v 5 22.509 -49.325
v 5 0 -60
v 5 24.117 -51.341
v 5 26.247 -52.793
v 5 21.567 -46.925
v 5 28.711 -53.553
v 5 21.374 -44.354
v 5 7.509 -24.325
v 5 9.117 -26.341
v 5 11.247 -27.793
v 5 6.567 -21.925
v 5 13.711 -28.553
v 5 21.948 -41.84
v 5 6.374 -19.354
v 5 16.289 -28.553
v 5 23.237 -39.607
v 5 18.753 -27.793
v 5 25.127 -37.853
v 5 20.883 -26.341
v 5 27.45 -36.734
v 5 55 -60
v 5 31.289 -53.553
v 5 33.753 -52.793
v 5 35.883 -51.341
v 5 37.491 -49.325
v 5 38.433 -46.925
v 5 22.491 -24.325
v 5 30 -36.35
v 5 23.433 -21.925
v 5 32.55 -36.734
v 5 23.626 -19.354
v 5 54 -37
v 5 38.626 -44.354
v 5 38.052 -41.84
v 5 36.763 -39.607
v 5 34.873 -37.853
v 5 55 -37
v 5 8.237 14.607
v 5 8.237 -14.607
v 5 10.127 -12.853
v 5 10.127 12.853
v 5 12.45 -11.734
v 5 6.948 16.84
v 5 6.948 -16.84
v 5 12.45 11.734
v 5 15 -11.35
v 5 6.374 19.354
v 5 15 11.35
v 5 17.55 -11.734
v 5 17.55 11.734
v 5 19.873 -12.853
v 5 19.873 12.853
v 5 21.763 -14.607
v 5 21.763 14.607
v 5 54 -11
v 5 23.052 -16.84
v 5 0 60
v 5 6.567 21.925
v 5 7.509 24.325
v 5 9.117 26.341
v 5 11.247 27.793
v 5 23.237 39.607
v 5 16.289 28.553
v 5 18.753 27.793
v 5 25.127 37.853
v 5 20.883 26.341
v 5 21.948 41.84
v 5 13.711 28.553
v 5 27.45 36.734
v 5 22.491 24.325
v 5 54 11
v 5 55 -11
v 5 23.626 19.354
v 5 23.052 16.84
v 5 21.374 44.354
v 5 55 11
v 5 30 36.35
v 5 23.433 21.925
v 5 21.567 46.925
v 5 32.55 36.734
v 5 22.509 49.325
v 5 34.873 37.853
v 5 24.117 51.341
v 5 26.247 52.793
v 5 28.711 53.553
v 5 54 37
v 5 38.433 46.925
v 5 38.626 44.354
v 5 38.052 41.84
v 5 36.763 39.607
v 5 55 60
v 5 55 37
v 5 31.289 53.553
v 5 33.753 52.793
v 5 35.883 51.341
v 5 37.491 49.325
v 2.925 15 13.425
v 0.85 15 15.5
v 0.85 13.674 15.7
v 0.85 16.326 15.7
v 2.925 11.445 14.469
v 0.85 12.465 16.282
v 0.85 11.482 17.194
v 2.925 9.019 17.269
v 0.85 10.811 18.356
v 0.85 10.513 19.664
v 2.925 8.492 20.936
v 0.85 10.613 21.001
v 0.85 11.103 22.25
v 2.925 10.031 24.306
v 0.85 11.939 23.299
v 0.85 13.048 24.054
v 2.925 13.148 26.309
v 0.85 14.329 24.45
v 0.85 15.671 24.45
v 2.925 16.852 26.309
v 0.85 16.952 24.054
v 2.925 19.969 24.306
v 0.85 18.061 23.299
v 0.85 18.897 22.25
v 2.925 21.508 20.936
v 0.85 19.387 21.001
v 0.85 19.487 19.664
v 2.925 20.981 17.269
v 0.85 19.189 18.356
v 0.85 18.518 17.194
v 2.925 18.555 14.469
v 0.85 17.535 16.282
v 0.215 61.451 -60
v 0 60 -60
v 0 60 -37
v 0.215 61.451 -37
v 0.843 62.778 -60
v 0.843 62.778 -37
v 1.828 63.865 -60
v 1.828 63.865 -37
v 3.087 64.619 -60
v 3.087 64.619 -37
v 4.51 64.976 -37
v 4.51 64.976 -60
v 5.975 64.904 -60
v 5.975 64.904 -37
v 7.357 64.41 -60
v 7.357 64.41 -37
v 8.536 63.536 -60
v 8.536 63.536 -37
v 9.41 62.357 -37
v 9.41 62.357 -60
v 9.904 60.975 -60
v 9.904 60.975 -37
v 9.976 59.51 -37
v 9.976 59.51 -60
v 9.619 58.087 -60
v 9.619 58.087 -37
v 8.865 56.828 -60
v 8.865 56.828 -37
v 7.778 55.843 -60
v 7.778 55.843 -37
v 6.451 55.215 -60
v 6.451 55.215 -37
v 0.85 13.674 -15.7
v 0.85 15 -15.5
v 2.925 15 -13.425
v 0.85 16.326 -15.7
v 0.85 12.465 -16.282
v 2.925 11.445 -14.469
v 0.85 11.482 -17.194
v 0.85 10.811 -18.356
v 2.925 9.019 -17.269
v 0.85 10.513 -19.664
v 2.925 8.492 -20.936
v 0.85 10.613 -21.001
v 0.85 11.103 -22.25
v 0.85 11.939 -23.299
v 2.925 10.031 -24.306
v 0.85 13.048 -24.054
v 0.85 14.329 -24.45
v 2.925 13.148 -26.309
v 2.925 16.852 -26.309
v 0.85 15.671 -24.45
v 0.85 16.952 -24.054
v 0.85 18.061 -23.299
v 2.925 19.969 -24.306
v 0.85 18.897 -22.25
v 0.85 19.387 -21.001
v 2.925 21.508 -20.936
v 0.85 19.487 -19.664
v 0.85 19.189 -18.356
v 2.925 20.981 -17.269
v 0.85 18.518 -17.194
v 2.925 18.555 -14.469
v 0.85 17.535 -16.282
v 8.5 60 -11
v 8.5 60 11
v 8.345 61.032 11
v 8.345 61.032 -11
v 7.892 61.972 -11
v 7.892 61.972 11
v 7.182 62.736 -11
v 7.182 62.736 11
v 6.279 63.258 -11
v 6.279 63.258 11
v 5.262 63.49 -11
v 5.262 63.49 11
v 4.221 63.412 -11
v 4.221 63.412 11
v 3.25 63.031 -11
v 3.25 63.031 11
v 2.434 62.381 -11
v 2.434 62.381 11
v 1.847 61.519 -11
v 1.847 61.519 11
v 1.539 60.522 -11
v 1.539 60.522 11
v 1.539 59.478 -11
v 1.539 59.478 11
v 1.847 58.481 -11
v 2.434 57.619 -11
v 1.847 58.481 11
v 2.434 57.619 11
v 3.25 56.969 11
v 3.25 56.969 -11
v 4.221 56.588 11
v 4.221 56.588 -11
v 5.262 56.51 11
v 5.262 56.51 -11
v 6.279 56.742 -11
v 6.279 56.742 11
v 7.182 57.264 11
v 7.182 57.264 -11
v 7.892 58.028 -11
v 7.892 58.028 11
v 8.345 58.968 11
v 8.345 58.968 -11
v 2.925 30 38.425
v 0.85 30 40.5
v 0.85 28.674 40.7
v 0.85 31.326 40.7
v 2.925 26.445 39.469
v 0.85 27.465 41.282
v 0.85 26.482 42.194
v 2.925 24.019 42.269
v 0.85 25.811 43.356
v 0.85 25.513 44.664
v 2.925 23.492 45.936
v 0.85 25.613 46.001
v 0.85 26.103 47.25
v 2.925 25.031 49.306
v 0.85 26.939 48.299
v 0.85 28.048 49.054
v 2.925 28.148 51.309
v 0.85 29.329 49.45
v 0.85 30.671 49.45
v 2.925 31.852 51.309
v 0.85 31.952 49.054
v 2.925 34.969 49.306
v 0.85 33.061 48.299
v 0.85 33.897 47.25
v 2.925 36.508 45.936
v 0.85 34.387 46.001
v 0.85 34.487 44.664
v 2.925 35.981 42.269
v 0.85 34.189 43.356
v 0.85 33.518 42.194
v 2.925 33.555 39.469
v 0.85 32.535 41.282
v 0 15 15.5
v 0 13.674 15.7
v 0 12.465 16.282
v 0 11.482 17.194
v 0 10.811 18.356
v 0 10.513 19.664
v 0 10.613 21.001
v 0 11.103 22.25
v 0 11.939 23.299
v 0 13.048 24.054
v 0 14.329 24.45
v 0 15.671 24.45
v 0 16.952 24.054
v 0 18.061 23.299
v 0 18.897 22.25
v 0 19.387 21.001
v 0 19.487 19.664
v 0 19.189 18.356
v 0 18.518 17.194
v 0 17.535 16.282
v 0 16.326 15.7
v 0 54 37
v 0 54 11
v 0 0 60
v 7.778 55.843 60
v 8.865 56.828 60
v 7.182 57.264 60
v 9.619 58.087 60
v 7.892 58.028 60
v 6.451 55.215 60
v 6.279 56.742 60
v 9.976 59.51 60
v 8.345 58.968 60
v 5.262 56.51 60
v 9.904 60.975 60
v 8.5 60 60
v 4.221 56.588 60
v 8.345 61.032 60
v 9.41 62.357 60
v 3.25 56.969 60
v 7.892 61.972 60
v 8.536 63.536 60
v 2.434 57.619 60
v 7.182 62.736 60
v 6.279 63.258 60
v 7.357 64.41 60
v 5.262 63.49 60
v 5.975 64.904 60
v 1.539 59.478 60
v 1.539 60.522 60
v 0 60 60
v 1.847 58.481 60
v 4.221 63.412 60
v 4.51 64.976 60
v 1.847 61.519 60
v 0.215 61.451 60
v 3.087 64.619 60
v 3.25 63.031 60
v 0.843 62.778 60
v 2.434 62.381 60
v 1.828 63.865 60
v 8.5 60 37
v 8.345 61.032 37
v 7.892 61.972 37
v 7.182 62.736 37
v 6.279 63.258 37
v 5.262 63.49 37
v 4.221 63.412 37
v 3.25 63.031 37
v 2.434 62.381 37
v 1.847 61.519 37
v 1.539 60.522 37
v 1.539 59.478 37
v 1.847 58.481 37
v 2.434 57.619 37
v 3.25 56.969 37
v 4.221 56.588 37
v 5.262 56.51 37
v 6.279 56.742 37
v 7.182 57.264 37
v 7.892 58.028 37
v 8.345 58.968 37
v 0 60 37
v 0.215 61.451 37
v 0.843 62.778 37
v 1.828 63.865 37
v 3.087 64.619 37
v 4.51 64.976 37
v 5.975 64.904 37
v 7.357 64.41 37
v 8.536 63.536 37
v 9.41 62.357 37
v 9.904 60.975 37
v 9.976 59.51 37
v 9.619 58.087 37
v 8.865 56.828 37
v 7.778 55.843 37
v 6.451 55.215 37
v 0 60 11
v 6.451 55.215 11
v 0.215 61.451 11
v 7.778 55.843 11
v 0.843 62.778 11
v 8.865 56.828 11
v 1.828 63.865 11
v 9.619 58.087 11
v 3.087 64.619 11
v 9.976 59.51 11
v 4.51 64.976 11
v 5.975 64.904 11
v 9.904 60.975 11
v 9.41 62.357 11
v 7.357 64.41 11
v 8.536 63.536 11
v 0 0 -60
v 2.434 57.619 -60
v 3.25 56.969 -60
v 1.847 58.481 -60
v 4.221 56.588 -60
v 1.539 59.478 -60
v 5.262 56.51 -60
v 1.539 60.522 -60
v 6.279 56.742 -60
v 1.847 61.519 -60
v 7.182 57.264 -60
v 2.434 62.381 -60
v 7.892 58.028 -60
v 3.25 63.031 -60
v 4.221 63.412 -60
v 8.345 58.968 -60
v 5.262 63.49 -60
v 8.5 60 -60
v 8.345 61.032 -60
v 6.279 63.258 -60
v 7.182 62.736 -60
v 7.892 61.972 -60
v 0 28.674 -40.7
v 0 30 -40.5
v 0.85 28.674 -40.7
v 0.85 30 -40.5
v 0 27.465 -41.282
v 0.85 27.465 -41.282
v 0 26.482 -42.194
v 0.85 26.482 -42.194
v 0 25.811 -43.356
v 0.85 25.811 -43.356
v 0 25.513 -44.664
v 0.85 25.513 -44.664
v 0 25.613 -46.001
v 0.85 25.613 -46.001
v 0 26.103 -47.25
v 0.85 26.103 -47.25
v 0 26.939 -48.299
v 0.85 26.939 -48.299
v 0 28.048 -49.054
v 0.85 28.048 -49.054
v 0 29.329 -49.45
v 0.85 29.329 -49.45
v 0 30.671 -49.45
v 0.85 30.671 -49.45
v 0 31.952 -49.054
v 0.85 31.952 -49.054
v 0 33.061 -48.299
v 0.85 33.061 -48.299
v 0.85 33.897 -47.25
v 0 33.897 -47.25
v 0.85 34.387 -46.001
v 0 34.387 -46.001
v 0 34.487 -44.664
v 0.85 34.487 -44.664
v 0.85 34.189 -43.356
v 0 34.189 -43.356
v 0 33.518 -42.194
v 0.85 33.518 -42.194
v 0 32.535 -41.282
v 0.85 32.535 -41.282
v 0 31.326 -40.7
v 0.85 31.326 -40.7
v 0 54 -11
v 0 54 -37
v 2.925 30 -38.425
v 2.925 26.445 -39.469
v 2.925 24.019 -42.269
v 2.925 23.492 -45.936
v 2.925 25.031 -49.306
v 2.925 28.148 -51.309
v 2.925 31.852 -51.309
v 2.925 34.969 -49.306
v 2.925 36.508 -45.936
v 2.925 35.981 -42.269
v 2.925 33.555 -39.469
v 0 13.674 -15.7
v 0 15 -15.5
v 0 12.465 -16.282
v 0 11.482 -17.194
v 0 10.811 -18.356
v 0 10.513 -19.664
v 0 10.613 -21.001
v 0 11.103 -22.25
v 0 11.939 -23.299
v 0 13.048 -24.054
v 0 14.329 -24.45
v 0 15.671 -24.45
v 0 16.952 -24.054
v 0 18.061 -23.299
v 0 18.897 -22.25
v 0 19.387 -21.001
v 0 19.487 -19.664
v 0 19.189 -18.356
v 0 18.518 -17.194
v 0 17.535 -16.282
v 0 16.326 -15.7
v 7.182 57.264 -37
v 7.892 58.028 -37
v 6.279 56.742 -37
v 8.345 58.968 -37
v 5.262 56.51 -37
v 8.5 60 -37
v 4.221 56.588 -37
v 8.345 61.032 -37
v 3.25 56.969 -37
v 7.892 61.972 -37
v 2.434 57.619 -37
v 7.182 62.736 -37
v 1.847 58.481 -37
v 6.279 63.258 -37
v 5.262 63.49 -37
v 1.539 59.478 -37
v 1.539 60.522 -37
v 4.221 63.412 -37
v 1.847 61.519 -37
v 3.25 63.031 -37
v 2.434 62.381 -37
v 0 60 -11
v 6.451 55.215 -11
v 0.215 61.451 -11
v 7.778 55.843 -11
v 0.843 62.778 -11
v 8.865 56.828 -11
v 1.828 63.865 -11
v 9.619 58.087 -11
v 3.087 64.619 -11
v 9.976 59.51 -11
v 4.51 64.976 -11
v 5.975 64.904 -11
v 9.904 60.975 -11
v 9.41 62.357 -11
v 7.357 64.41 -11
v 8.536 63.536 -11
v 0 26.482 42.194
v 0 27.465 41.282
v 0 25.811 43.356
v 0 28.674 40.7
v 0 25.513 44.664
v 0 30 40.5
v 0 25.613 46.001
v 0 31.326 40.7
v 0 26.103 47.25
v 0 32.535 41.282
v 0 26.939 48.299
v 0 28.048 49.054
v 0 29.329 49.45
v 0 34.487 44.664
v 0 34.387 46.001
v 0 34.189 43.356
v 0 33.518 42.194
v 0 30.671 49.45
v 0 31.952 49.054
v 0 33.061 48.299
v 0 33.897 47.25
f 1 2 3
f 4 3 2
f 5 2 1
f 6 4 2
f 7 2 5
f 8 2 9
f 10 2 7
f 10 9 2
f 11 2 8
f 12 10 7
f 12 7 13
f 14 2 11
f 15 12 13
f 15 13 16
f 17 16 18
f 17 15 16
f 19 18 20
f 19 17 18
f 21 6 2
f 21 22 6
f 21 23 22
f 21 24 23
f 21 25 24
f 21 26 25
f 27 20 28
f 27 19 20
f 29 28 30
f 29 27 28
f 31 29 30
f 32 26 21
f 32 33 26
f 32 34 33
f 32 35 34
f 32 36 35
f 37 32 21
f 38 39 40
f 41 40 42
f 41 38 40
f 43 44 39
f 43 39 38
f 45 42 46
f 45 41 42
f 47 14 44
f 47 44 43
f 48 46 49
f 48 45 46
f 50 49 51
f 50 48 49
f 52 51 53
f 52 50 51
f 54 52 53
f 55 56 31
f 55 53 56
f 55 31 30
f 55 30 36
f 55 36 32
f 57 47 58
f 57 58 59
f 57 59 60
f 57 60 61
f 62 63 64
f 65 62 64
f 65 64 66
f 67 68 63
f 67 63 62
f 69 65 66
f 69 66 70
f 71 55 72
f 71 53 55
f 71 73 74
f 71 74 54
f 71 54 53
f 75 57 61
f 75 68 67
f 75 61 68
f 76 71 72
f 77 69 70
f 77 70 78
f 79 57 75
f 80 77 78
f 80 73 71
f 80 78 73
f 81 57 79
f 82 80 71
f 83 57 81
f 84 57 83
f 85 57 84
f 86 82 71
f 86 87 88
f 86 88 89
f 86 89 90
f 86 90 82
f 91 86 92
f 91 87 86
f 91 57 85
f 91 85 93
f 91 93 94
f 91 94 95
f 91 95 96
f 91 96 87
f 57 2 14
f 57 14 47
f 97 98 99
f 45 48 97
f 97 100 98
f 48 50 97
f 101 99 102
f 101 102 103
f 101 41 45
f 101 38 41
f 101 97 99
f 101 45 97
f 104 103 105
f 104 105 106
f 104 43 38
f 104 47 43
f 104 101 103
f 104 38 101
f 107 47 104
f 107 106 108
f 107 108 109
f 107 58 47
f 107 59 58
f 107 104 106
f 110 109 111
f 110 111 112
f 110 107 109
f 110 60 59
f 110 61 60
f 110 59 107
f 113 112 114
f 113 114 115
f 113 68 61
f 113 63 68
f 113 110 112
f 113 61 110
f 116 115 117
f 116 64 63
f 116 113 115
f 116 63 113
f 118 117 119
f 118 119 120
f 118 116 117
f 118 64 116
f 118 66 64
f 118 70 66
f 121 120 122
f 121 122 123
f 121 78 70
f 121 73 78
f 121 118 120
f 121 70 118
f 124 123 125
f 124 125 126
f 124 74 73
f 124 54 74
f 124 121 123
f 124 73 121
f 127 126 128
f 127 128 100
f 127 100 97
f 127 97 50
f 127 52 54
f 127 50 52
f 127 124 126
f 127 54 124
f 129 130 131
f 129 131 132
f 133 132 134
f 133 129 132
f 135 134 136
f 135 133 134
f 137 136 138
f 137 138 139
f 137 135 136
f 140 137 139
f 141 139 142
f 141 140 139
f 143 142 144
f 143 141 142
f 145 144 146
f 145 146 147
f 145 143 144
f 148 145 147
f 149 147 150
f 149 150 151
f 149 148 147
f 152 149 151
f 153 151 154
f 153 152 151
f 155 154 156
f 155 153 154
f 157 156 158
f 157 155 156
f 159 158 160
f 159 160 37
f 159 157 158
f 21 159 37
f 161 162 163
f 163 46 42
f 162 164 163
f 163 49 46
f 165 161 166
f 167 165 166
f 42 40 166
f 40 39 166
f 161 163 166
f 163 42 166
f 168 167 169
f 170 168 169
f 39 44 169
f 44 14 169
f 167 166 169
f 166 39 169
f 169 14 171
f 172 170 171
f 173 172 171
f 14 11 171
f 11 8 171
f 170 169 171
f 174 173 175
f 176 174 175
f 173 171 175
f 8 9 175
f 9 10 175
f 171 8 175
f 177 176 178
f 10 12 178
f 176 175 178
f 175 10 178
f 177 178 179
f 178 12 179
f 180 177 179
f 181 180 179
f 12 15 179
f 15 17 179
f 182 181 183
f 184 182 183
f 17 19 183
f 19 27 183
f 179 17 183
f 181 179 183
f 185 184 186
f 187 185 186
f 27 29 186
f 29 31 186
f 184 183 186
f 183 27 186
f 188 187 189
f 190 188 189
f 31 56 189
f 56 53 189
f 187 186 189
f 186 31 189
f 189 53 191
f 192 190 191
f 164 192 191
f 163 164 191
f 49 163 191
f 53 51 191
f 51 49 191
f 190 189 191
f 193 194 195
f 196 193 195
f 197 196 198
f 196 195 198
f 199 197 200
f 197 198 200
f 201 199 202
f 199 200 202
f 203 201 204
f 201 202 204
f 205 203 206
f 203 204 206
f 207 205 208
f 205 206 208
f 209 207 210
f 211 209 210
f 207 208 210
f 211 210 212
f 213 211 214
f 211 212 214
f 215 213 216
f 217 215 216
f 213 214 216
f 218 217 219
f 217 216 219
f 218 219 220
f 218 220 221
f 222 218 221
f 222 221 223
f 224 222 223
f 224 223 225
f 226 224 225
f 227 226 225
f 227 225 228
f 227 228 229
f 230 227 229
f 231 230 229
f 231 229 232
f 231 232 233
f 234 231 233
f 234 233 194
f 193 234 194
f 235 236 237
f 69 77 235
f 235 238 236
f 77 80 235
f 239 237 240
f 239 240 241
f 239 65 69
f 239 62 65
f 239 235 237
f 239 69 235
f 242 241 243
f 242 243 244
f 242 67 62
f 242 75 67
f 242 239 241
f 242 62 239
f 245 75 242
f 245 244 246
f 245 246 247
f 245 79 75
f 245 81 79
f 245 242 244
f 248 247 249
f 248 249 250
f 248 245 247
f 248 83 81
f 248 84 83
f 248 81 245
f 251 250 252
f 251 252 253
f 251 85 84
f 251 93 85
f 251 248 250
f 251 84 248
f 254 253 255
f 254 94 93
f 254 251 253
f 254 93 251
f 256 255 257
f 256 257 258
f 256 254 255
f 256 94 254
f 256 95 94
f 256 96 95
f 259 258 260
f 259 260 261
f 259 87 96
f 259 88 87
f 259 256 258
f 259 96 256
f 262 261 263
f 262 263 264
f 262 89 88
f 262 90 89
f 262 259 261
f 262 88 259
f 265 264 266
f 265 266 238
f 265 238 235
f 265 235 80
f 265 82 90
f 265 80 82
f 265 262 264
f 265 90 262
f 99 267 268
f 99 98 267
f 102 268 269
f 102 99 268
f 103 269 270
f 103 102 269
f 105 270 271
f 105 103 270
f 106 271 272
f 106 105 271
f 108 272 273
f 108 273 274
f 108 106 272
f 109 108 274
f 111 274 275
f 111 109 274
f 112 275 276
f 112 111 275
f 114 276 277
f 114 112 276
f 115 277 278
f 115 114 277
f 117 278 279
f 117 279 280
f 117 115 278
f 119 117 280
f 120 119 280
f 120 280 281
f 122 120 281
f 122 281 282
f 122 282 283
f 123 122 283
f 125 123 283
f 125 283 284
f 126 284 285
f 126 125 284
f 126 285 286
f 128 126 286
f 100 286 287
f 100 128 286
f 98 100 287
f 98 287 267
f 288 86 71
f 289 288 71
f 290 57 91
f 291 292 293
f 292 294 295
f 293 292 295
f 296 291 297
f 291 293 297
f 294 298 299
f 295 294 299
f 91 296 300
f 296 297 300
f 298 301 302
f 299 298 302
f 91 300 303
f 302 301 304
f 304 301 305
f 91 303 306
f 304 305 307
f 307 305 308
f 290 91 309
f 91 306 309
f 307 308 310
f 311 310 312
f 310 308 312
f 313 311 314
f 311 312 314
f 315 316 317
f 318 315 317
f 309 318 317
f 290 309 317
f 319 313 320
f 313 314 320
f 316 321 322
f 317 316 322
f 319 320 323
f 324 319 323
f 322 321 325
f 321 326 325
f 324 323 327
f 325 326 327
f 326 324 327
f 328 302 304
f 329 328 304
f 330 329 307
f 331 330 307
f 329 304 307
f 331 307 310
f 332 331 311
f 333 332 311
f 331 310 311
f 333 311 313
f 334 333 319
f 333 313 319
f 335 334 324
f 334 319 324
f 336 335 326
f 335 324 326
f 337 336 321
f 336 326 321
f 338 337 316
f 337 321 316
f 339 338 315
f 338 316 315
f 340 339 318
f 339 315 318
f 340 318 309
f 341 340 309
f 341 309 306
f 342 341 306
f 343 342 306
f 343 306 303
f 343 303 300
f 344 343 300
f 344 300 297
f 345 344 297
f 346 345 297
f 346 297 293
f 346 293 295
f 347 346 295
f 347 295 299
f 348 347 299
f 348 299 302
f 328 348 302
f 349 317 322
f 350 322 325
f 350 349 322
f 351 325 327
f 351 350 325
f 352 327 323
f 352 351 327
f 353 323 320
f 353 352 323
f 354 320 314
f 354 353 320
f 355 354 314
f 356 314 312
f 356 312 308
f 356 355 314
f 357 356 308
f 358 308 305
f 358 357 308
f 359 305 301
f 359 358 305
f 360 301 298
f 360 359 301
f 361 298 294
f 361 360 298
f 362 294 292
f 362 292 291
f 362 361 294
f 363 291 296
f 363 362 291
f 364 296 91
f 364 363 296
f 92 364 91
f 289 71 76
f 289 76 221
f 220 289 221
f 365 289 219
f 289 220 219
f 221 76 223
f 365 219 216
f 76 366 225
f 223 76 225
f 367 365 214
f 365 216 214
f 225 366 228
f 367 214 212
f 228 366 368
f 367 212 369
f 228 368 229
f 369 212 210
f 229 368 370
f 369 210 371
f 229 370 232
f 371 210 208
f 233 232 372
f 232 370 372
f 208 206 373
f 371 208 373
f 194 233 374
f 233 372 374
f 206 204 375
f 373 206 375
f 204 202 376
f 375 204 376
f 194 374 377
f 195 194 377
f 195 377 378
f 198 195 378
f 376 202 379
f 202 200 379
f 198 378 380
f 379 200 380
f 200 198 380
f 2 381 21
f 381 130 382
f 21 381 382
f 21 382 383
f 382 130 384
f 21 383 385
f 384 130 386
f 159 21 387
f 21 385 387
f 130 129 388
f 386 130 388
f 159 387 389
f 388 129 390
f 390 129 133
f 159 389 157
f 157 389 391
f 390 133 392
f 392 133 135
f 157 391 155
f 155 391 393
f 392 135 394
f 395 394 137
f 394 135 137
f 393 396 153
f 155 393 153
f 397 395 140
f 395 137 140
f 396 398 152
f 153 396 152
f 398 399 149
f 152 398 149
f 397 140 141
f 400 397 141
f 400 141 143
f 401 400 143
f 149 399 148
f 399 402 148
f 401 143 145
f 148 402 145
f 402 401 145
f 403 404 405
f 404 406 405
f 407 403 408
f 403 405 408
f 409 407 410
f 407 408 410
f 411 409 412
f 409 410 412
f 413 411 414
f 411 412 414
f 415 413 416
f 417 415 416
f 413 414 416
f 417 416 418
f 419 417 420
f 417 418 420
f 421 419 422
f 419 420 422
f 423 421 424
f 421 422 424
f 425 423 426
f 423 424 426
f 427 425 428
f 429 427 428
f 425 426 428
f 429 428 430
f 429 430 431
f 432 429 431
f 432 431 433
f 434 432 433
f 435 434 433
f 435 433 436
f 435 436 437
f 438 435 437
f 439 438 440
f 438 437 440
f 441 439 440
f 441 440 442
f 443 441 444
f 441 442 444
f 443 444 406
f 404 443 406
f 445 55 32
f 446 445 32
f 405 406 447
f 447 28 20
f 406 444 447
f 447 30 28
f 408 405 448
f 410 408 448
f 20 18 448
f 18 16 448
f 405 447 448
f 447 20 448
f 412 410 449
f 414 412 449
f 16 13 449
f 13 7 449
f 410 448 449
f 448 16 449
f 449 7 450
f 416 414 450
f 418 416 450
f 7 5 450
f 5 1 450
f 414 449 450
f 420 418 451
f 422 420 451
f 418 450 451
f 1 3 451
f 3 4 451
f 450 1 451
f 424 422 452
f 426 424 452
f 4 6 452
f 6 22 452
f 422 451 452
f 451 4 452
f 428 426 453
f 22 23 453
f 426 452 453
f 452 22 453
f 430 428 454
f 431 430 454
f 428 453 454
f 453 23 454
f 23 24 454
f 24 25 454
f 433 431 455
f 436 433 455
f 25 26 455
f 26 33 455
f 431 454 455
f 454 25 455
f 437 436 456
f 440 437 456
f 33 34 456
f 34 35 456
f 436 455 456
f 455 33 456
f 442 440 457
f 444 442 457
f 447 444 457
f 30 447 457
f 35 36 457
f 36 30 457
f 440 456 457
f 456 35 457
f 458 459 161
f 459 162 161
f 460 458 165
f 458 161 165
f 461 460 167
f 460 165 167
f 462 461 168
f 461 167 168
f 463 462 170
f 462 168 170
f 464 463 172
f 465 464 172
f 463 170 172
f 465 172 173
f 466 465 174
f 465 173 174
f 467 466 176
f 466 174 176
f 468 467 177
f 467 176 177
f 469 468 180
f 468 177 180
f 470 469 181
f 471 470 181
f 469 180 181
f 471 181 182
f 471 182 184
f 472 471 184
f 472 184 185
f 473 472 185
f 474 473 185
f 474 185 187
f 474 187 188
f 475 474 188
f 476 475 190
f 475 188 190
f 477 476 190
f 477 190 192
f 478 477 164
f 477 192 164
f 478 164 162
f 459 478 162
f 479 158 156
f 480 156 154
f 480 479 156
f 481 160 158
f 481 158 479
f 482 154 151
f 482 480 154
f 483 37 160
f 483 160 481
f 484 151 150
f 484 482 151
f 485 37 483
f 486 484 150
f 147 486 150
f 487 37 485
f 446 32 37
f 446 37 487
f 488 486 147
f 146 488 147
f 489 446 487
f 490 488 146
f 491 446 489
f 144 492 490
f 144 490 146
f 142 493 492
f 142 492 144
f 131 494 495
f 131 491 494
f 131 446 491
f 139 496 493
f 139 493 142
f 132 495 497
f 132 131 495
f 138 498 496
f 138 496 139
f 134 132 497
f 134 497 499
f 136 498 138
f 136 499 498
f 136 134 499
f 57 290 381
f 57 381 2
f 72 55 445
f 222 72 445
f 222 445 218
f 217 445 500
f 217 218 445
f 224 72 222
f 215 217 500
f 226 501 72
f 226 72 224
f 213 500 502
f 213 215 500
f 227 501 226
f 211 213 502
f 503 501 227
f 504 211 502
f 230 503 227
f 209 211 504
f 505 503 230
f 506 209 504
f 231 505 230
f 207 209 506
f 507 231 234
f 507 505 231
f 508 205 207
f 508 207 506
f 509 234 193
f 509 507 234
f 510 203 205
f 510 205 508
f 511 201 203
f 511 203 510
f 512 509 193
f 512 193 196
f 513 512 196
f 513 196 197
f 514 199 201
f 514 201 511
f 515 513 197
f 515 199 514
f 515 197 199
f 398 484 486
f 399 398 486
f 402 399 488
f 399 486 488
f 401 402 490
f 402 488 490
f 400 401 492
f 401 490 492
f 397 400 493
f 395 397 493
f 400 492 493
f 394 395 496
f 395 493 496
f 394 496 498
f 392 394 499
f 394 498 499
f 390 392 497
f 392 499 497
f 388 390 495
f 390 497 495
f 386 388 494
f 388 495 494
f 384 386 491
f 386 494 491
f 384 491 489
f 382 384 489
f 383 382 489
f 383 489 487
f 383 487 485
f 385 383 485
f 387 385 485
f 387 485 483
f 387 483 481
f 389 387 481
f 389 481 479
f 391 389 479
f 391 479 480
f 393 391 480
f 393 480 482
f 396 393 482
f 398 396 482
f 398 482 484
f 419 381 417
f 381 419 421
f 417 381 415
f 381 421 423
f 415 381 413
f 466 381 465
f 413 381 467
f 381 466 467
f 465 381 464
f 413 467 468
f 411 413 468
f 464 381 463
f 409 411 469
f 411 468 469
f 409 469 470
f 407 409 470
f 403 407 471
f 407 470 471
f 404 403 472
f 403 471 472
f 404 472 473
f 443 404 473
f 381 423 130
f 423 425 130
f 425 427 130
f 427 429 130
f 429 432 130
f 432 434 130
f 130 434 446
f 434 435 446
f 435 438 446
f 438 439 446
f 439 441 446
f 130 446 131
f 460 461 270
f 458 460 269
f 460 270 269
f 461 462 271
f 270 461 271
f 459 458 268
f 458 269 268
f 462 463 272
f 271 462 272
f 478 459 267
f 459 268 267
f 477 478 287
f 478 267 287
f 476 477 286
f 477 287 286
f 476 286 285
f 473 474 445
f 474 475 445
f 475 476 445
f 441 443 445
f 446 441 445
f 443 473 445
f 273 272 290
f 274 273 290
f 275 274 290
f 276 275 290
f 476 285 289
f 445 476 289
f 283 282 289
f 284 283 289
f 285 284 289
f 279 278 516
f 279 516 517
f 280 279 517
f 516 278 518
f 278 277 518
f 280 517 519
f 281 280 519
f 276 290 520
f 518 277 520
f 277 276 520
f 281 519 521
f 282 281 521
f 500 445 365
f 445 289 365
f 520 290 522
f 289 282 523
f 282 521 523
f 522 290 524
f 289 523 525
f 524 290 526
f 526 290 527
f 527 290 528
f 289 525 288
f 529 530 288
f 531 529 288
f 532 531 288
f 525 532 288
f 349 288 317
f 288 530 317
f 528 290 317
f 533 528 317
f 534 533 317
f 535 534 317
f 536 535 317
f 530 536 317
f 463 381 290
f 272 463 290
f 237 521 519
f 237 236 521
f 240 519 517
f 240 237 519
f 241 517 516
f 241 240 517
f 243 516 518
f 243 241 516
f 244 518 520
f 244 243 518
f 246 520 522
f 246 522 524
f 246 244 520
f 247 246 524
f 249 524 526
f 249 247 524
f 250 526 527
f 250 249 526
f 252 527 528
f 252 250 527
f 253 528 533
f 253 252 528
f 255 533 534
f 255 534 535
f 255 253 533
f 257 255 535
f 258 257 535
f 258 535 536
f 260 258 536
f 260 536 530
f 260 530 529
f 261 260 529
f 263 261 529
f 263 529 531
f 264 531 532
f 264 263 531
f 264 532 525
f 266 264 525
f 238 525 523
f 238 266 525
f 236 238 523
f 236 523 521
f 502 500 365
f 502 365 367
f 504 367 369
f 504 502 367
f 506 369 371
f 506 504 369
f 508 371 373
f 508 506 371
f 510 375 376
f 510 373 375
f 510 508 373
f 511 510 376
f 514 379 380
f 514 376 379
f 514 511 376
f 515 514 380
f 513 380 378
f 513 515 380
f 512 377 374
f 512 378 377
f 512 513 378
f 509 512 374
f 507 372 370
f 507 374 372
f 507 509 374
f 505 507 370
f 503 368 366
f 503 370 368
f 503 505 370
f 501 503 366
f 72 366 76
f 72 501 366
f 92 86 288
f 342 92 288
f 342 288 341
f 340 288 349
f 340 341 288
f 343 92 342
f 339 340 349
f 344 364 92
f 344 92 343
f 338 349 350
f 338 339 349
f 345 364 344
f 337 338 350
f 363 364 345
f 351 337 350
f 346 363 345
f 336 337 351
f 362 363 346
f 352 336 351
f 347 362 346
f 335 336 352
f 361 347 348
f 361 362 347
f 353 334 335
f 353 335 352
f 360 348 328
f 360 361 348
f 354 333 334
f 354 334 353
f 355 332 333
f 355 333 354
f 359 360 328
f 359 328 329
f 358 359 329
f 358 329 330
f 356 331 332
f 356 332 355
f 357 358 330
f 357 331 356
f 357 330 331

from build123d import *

# Parameters (mm, degrees)
SKETCH15_W                                     = 5
SKETCH15_H                                     = 60
EXTRUDE_THIN2_DEPTH                            = 60
SKETCH16_R                                     = 5
SKETCH17_R                                     = 3.5
CUT_EXTRUDE4_DEPTH                             = 137.839321834
CSK_FOR_M8_FLAT_HEAD_MACHINE_SCREW4_AT_2_COUNT = 2
CSK_FOR_M8_FLAT_HEAD_MACHINE_SCREW4_AT_2_PITCH = 29.154759474
SKETCH37_W                                     = 26
SKETCH37_H                                     = 11
F_2CUTS_DEPTH                                  = 89.600225733
F_2CUTS_DEPTH_BACK                             = 89.600225733


with BuildPart() as part:
    # Sketch15 → Extrude-Thin2 (new, symmetric)
    with BuildSketch(Plane.XY):
        with Locations((2.5, 30)):
            Rectangle(SKETCH15_W, SKETCH15_H)
    extrude(amount=EXTRUDE_THIN2_DEPTH, both=True)

    # Sweep2: sweep along a curve in space
    with BuildLine() as sweep2_path:
        Line((5, 60, 60), (5, 60, -60))
    # Sketch16 → Sweep2 (sweep)
    with BuildSketch(Plane(origin=(0, 0, -60), x_dir=(-1, 0, 0), z_dir=(0, 0, -1))):
        with Locations((-5, 60)):
            Circle(SKETCH16_R)
    sweep(path=sweep2_path.line)

    # Sketch17 → Cut-Extrude4 (cut, through all)
    with BuildSketch(Plane.XY.offset(60)):
        with Locations((5, 60)):
            Circle(SKETCH17_R)
    extrude(amount=-CUT_EXTRUDE4_DEPTH, mode=Mode.SUBTRACT)

    # Sketch18 → CSK for M8 Flat Head Machine Screw4 (revolve, cut)
    with BuildSketch(Plane(origin=(5, 30, 45), x_dir=(0, 0, -1), z_dir=(0, 1, 0))):
        Polygon((0, 0), (0, 5), (4.5, 5), (4.5, 4.15), (8.65, 0), align=None)
    csk_for_m8_flat_head_machine_screw4 = revolve(axis=Axis((11.35, 30, 45), (-1, 0, 0)), mode=Mode.SUBTRACT)

    # CSK for M8 Flat Head Machine Screw4 at 2: CSK for M8 Flat Head Machine Screw4 ×2
    with Locations(*[Vector(0, -0.5144957554275265, -0.8574929257125442) * (i * CSK_FOR_M8_FLAT_HEAD_MACHINE_SCREW4_AT_2_PITCH) for i in range(1, CSK_FOR_M8_FLAT_HEAD_MACHINE_SCREW4_AT_2_COUNT)]):
        add(csk_for_m8_flat_head_machine_screw4, mode=Mode.SUBTRACT)

    # Mirror7: CSK for M8 Flat Head Machine Screw4 across plane
    add(csk_for_m8_flat_head_machine_screw4.mirror(Plane.XY), mode=Mode.SUBTRACT)

    # Mirror7 copy 1 sketch → Mirror7 copy 1 (revolve, cut)
    with BuildSketch(Plane(origin=(5, 15, -20), x_dir=(0, 0, 1), z_dir=(0, 1, 0))):
        Polygon((0, 0), (0, -5), (4.5, -5), (4.5, -4.15), (8.65, 0), align=None)
    revolve(axis=Axis((11.35, 15, -20), (1, 0, 0)), mode=Mode.SUBTRACT)

    # Sketch37 → 2Cuts (cut, two sides)
    with BuildSketch(Plane(origin=(5, 0, 0), x_dir=(0, 0, -1), z_dir=(1, 0, 0))) as f_2cuts_sk:
        with Locations((24, 59.5)):
            Rectangle(SKETCH37_W, SKETCH37_H)
        with Locations((-24, 59.5)):
            Rectangle(SKETCH37_W, SKETCH37_H)
    extrude(amount=F_2CUTS_DEPTH, mode=Mode.SUBTRACT)
    extrude(f_2cuts_sk.sketch, amount=-F_2CUTS_DEPTH_BACK, mode=Mode.SUBTRACT)


solid = part.part
